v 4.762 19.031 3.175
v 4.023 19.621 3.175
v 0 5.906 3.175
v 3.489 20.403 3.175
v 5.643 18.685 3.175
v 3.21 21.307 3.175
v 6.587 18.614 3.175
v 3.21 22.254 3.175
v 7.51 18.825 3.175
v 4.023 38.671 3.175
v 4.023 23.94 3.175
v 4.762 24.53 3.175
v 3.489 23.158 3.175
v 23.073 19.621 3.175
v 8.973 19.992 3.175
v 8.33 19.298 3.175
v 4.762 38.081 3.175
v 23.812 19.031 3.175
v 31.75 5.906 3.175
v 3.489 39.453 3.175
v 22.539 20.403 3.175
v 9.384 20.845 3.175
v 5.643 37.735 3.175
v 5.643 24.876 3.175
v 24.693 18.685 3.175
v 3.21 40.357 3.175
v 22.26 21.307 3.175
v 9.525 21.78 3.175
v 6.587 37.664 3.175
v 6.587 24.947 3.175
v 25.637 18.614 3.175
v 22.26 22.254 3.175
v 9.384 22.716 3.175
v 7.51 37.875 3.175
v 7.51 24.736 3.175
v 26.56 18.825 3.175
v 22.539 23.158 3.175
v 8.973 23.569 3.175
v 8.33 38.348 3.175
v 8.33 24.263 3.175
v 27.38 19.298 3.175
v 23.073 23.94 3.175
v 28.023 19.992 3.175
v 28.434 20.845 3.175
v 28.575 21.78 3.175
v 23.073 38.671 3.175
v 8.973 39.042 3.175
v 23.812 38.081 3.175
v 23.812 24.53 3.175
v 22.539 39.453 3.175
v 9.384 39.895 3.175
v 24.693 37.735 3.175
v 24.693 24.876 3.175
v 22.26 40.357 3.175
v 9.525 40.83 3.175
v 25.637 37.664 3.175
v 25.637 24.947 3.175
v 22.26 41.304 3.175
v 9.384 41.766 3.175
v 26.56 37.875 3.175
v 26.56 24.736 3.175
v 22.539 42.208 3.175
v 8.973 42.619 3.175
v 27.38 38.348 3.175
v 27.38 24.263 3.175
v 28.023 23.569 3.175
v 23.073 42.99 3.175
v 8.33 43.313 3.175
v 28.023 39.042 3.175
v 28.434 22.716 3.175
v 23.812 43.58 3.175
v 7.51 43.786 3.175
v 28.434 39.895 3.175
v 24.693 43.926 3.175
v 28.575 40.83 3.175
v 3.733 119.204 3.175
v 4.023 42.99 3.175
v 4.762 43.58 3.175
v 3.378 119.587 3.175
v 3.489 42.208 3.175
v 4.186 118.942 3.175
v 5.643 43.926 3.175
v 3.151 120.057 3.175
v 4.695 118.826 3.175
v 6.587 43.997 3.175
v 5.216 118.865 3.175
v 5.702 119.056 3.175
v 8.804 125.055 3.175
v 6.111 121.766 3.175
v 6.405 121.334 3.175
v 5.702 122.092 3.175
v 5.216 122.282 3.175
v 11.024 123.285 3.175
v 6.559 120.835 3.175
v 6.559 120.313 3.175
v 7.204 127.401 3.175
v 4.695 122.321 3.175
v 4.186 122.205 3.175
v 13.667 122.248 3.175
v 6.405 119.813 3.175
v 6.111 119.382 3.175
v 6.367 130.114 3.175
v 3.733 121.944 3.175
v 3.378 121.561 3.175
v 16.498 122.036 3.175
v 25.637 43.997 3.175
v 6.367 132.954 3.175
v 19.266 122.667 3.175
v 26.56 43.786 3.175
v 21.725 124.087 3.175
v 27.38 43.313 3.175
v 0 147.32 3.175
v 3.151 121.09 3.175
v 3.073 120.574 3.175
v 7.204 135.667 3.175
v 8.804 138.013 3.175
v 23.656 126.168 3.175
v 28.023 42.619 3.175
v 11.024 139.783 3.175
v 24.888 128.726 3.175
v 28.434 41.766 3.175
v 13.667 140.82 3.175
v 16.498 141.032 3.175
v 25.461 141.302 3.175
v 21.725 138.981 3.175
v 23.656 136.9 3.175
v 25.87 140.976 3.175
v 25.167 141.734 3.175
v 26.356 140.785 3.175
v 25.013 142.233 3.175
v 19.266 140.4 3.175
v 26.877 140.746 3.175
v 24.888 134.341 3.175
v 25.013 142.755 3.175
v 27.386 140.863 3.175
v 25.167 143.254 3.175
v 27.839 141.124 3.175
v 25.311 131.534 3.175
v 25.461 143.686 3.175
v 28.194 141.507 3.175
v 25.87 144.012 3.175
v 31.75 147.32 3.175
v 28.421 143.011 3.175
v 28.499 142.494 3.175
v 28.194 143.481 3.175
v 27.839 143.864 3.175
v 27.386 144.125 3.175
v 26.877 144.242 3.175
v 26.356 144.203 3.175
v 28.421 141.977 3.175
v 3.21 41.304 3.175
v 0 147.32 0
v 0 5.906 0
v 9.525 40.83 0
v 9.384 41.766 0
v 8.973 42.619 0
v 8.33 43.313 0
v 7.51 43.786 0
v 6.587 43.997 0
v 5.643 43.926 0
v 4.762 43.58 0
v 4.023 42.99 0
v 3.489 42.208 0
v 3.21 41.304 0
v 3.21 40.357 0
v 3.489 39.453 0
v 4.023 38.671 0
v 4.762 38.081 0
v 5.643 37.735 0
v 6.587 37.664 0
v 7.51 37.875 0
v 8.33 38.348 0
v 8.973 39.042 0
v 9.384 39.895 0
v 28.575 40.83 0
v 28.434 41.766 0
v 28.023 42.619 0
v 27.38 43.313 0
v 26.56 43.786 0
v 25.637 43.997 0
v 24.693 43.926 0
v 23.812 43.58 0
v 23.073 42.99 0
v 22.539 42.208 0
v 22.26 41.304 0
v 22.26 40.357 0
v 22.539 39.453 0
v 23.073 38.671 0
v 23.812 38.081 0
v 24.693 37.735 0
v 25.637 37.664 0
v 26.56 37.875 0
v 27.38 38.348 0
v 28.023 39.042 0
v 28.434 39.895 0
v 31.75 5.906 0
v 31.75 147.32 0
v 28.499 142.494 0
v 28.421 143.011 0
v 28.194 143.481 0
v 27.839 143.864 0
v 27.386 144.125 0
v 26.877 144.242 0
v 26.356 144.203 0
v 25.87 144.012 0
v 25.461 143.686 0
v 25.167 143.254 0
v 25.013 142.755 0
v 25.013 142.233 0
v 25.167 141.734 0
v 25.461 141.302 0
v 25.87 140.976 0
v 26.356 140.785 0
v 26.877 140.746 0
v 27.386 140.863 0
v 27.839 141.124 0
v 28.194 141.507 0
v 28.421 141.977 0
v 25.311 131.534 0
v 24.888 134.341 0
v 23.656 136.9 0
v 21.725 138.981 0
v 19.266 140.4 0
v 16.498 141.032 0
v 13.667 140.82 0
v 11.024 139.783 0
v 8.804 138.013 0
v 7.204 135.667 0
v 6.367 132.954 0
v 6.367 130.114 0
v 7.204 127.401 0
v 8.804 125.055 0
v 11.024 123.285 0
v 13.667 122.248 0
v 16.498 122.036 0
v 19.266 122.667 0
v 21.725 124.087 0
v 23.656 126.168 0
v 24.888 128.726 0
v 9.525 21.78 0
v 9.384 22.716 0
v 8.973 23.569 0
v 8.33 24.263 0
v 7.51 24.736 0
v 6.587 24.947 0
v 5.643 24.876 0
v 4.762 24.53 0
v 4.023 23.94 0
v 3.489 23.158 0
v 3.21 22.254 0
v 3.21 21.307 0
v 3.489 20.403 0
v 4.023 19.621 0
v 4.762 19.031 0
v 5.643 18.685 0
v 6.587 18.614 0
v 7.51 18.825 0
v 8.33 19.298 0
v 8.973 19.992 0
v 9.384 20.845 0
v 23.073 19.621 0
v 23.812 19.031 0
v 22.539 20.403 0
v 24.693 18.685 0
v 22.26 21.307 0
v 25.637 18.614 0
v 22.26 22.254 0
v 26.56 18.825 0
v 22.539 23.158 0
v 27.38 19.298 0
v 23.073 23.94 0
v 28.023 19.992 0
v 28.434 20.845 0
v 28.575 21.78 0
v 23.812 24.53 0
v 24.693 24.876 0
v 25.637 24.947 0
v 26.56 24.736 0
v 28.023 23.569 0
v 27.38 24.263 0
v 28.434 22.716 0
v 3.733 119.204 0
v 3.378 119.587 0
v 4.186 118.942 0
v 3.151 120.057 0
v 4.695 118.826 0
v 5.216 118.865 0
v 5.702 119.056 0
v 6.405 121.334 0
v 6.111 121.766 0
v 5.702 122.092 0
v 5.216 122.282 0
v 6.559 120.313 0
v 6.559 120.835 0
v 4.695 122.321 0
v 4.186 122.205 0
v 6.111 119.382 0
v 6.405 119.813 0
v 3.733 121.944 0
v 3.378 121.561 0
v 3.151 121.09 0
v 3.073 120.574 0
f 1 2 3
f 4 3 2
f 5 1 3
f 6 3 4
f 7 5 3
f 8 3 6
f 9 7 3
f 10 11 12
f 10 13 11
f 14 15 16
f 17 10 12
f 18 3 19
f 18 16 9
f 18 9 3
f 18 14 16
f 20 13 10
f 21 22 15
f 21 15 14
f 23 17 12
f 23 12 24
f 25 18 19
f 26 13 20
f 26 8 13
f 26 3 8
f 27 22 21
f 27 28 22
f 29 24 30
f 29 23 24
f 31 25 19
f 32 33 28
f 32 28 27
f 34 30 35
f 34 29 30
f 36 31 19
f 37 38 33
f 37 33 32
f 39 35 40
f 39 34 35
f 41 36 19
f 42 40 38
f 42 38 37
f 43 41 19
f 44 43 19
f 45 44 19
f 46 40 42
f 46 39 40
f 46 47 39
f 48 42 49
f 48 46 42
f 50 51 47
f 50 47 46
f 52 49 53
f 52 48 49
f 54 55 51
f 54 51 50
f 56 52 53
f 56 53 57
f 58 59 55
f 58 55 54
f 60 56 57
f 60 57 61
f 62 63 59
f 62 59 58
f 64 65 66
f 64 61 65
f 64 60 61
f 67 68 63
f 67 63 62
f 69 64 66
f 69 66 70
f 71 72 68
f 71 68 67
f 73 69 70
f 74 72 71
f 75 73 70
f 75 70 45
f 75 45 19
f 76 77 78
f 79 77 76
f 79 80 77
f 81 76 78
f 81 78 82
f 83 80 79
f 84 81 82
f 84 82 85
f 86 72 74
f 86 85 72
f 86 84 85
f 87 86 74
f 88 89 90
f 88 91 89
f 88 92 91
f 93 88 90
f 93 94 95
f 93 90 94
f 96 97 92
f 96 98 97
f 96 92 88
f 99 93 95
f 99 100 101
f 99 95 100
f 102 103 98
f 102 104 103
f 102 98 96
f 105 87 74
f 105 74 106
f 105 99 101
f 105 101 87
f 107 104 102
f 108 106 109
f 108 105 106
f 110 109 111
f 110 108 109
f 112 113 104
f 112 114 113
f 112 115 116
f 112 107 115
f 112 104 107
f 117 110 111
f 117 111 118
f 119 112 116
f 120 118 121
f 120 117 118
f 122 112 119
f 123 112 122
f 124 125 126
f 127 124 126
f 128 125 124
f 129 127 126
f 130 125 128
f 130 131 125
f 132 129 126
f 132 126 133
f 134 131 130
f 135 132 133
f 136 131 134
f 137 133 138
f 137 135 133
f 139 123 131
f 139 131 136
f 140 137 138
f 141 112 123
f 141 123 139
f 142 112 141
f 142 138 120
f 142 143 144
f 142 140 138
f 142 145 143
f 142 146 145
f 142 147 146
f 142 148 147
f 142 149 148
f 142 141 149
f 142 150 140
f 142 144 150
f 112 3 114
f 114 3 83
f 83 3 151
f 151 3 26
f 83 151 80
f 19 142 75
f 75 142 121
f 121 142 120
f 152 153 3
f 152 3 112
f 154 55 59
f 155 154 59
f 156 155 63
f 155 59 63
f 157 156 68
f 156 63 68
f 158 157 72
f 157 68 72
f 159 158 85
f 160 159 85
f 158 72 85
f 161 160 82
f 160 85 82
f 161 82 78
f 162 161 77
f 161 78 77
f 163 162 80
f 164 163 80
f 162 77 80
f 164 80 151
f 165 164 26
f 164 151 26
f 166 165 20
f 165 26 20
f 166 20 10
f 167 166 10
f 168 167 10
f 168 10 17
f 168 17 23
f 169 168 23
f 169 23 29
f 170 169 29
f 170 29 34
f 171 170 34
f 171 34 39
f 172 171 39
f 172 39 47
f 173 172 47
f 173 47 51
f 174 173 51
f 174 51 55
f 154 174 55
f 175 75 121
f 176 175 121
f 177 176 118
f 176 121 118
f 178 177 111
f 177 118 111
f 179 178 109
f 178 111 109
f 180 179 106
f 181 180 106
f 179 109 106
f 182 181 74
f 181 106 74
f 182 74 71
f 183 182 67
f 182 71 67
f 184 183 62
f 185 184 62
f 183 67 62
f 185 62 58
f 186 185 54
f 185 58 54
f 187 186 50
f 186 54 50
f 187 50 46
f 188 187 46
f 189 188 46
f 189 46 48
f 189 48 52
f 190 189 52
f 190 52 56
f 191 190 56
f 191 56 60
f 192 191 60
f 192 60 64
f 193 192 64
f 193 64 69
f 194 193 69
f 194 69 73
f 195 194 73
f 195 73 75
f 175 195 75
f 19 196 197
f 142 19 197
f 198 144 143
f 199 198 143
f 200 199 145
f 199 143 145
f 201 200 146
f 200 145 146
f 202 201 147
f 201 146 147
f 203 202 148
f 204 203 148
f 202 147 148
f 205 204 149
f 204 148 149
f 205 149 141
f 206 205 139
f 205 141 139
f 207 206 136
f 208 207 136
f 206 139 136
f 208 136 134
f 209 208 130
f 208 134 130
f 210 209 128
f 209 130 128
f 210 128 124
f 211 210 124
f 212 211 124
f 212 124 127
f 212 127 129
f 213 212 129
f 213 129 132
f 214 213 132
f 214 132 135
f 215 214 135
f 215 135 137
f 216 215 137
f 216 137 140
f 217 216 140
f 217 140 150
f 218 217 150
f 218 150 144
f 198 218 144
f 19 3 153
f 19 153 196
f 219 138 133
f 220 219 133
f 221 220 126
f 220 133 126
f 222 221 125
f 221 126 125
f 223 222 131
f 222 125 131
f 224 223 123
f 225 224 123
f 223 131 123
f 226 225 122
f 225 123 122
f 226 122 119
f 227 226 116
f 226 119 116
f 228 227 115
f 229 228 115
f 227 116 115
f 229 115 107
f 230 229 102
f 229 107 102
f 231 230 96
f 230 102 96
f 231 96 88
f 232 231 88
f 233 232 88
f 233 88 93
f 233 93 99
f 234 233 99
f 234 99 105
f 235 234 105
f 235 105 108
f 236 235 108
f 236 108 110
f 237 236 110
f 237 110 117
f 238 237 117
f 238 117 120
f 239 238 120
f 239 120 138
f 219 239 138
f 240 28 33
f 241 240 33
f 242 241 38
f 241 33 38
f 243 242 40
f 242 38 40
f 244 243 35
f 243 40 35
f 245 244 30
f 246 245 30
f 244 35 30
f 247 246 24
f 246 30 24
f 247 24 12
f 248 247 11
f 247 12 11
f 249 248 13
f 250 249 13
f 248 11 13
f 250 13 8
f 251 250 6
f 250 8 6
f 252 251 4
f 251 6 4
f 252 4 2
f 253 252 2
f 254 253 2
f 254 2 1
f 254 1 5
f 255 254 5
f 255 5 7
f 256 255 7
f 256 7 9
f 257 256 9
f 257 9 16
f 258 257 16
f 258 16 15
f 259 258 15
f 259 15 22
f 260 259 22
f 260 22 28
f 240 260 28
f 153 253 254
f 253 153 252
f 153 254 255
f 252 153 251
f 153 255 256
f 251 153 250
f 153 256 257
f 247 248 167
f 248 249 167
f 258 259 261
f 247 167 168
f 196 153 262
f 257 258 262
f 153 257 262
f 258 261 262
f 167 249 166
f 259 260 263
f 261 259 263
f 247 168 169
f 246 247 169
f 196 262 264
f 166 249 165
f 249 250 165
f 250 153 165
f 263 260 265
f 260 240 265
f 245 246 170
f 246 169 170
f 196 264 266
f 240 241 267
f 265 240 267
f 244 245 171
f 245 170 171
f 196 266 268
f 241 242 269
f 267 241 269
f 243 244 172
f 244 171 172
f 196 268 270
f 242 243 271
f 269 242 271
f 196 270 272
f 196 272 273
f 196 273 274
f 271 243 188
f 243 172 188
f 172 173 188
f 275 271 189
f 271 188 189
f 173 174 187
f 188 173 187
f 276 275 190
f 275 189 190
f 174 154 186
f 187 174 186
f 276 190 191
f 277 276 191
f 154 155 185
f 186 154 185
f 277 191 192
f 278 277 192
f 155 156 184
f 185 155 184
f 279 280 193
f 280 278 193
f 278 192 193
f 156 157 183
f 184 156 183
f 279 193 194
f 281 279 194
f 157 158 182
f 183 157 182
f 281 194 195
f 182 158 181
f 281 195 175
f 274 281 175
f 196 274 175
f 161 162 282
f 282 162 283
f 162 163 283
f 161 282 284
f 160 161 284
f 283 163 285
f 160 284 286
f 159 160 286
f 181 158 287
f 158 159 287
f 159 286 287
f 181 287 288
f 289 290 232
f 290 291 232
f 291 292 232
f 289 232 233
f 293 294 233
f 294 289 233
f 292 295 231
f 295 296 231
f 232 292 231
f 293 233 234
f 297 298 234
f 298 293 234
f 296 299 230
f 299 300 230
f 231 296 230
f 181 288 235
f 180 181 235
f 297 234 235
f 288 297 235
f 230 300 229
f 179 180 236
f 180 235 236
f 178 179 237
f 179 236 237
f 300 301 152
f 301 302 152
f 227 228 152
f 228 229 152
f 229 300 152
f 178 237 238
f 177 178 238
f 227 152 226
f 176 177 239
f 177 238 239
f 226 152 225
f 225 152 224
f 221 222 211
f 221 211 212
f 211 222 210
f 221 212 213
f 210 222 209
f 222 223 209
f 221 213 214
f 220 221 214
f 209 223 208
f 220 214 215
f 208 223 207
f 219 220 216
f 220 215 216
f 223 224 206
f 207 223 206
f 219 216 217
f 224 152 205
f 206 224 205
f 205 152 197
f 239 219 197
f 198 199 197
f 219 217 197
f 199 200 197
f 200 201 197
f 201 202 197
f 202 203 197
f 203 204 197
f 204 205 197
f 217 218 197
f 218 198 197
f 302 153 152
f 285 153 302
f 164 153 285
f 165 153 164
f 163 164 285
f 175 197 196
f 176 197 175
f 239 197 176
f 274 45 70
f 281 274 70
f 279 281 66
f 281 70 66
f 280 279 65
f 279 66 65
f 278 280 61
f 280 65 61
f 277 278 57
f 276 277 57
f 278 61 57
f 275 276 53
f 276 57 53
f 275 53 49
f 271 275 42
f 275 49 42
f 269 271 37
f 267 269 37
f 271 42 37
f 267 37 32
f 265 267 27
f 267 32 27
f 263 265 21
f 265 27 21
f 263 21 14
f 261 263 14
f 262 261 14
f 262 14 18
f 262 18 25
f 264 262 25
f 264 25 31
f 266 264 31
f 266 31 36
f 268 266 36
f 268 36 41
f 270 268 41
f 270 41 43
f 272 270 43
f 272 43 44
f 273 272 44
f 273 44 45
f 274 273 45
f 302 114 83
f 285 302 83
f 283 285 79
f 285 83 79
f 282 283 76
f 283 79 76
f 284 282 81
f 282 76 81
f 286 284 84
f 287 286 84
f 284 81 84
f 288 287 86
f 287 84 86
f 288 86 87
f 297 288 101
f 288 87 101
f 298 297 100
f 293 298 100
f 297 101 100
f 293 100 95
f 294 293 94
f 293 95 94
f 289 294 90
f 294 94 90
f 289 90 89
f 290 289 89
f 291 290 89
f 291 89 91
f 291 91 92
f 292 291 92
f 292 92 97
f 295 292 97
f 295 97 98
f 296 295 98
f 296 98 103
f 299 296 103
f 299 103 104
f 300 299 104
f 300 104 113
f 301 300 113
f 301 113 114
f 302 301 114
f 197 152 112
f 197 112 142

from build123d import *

# Parameters (mm, degrees)
SKETCH1_W           = 31.75
SKETCH1_H           = 147.32
BOSS_EXTRUDE1_DEPTH = 3.175
CUT_EXTRUDE4_REACH  = 5.175
SKETCH5_W           = 31.75
SKETCH5_H           = 5.842
CUT_EXTRUDE5_REACH  = 5.175
SKETCH6_W           = 31.75
SKETCH6_H           = 0.0635
CUT_EXTRUDE6_REACH  = 5.175
SKETCH8_R           = 3.175
SKETCH10_R          = 9.525
CUT_EXTRUDE7_DEPTH  = 4.175


with BuildPart() as part:
    # Sketch1 → Boss-Extrude1 (new body)
    with BuildSketch(Plane.XY):
        with Locations((15.875, 73.66)):
            Rectangle(SKETCH1_W, SKETCH1_H)
    extrude(amount=BOSS_EXTRUDE1_DEPTH)

    # Sketch5 → Cut-Extrude4 (cut, up to next)
    with BuildSketch(Plane.XY.offset(3.175), mode=Mode.PRIVATE) as cut_extrude4_sk1:
        with Locations((15.875, 2.921)):
            Rectangle(SKETCH5_W, SKETCH5_H)
    cut_extrude4_tool1 = extrude(cut_extrude4_sk1.sketch, amount=-CUT_EXTRUDE4_REACH, mode=Mode.PRIVATE) & part.part
    add(cut_extrude4_tool1.solids().sort_by_distance((15.875, 2.921, 3.175))[0], mode=Mode.SUBTRACT)

    # Sketch6 → Cut-Extrude5 (cut, up to next)
    with BuildSketch(Plane.XY.offset(3.175), mode=Mode.PRIVATE) as cut_extrude5_sk1:
        with Locations((15.875, 5.87375)):
            Rectangle(SKETCH6_W, SKETCH6_H)
    cut_extrude5_tool1 = extrude(cut_extrude5_sk1.sketch, amount=-CUT_EXTRUDE5_REACH, mode=Mode.PRIVATE) & part.part
    add(cut_extrude5_tool1.solids().sort_by_distance((15.875, 5.87375, 3.175))[0], mode=Mode.SUBTRACT)

    # Sketch8 → Cut-Extrude6 (cut, up to next)
    with BuildSketch(Plane.XY.offset(3.175), mode=Mode.PRIVATE) as cut_extrude6_sk1:
        with Locations((25.4, 40.8305)):
            Circle(SKETCH8_R)
    cut_extrude6_tool1 = extrude(cut_extrude6_sk1.sketch, amount=-CUT_EXTRUDE6_REACH, mode=Mode.PRIVATE) & part.part
    add(cut_extrude6_tool1.solids().sort_by_distance((25.4, 40.8305, 3.175))[0], mode=Mode.SUBTRACT)
    # Sketch8 → Cut-Extrude6 (cut, up to next)
    with BuildSketch(Plane.XY.offset(3.175), mode=Mode.PRIVATE) as cut_extrude6_sk2:
        with Locations((6.35, 40.8305)):
            Circle(SKETCH8_R)
    cut_extrude6_tool2 = extrude(cut_extrude6_sk2.sketch, amount=-CUT_EXTRUDE6_REACH, mode=Mode.PRIVATE) & part.part
    add(cut_extrude6_tool2.solids().sort_by_distance((6.35, 40.8305, 3.175))[0], mode=Mode.SUBTRACT)
    # Sketch8 → Cut-Extrude6 (cut, up to next)
    with BuildSketch(Plane.XY.offset(3.175), mode=Mode.PRIVATE) as cut_extrude6_sk3:
        with Locations((6.35, 21.7805)):
            Circle(SKETCH8_R)
    cut_extrude6_tool3 = extrude(cut_extrude6_sk3.sketch, amount=-CUT_EXTRUDE6_REACH, mode=Mode.PRIVATE) & part.part
    add(cut_extrude6_tool3.solids().sort_by_distance((6.35, 21.7805, 3.175))[0], mode=Mode.SUBTRACT)
    # Sketch8 → Cut-Extrude6 (cut, up to next)
    with BuildSketch(Plane.XY.offset(3.175), mode=Mode.PRIVATE) as cut_extrude6_sk4:
        with Locations((25.4, 21.7805)):
            Circle(SKETCH8_R)
    cut_extrude6_tool4 = extrude(cut_extrude6_sk4.sketch, amount=-CUT_EXTRUDE6_REACH, mode=Mode.PRIVATE) & part.part
    add(cut_extrude6_tool4.solids().sort_by_distance((25.4, 21.7805, 3.175))[0], mode=Mode.SUBTRACT)

    # Sketch10 → Cut-Extrude7 (cut, through all)
    with BuildSketch(Plane.XY.offset(3.175)):
        with Locations((15.7861, 131.5339)):
            Circle(SKETCH10_R)
        with BuildLine():
            ThreePointArc((6.5786, 120.5738), (4.826, 122.3264), (3.0734, 120.5738))
            ThreePointArc((3.0734, 120.5738), (4.826, 118.8212), (6.5786, 120.5738))
        make_face()
        with BuildLine():
            ThreePointArc((24.9936, 142.494), (26.7462, 140.7414), (28.4988, 142.494))
            ThreePointArc((28.4988, 142.494), (26.7462, 144.2466), (24.9936, 142.494))
        make_face()
    extrude(amount=-CUT_EXTRUDE7_DEPTH, mode=Mode.SUBTRACT)


solid = part.part
